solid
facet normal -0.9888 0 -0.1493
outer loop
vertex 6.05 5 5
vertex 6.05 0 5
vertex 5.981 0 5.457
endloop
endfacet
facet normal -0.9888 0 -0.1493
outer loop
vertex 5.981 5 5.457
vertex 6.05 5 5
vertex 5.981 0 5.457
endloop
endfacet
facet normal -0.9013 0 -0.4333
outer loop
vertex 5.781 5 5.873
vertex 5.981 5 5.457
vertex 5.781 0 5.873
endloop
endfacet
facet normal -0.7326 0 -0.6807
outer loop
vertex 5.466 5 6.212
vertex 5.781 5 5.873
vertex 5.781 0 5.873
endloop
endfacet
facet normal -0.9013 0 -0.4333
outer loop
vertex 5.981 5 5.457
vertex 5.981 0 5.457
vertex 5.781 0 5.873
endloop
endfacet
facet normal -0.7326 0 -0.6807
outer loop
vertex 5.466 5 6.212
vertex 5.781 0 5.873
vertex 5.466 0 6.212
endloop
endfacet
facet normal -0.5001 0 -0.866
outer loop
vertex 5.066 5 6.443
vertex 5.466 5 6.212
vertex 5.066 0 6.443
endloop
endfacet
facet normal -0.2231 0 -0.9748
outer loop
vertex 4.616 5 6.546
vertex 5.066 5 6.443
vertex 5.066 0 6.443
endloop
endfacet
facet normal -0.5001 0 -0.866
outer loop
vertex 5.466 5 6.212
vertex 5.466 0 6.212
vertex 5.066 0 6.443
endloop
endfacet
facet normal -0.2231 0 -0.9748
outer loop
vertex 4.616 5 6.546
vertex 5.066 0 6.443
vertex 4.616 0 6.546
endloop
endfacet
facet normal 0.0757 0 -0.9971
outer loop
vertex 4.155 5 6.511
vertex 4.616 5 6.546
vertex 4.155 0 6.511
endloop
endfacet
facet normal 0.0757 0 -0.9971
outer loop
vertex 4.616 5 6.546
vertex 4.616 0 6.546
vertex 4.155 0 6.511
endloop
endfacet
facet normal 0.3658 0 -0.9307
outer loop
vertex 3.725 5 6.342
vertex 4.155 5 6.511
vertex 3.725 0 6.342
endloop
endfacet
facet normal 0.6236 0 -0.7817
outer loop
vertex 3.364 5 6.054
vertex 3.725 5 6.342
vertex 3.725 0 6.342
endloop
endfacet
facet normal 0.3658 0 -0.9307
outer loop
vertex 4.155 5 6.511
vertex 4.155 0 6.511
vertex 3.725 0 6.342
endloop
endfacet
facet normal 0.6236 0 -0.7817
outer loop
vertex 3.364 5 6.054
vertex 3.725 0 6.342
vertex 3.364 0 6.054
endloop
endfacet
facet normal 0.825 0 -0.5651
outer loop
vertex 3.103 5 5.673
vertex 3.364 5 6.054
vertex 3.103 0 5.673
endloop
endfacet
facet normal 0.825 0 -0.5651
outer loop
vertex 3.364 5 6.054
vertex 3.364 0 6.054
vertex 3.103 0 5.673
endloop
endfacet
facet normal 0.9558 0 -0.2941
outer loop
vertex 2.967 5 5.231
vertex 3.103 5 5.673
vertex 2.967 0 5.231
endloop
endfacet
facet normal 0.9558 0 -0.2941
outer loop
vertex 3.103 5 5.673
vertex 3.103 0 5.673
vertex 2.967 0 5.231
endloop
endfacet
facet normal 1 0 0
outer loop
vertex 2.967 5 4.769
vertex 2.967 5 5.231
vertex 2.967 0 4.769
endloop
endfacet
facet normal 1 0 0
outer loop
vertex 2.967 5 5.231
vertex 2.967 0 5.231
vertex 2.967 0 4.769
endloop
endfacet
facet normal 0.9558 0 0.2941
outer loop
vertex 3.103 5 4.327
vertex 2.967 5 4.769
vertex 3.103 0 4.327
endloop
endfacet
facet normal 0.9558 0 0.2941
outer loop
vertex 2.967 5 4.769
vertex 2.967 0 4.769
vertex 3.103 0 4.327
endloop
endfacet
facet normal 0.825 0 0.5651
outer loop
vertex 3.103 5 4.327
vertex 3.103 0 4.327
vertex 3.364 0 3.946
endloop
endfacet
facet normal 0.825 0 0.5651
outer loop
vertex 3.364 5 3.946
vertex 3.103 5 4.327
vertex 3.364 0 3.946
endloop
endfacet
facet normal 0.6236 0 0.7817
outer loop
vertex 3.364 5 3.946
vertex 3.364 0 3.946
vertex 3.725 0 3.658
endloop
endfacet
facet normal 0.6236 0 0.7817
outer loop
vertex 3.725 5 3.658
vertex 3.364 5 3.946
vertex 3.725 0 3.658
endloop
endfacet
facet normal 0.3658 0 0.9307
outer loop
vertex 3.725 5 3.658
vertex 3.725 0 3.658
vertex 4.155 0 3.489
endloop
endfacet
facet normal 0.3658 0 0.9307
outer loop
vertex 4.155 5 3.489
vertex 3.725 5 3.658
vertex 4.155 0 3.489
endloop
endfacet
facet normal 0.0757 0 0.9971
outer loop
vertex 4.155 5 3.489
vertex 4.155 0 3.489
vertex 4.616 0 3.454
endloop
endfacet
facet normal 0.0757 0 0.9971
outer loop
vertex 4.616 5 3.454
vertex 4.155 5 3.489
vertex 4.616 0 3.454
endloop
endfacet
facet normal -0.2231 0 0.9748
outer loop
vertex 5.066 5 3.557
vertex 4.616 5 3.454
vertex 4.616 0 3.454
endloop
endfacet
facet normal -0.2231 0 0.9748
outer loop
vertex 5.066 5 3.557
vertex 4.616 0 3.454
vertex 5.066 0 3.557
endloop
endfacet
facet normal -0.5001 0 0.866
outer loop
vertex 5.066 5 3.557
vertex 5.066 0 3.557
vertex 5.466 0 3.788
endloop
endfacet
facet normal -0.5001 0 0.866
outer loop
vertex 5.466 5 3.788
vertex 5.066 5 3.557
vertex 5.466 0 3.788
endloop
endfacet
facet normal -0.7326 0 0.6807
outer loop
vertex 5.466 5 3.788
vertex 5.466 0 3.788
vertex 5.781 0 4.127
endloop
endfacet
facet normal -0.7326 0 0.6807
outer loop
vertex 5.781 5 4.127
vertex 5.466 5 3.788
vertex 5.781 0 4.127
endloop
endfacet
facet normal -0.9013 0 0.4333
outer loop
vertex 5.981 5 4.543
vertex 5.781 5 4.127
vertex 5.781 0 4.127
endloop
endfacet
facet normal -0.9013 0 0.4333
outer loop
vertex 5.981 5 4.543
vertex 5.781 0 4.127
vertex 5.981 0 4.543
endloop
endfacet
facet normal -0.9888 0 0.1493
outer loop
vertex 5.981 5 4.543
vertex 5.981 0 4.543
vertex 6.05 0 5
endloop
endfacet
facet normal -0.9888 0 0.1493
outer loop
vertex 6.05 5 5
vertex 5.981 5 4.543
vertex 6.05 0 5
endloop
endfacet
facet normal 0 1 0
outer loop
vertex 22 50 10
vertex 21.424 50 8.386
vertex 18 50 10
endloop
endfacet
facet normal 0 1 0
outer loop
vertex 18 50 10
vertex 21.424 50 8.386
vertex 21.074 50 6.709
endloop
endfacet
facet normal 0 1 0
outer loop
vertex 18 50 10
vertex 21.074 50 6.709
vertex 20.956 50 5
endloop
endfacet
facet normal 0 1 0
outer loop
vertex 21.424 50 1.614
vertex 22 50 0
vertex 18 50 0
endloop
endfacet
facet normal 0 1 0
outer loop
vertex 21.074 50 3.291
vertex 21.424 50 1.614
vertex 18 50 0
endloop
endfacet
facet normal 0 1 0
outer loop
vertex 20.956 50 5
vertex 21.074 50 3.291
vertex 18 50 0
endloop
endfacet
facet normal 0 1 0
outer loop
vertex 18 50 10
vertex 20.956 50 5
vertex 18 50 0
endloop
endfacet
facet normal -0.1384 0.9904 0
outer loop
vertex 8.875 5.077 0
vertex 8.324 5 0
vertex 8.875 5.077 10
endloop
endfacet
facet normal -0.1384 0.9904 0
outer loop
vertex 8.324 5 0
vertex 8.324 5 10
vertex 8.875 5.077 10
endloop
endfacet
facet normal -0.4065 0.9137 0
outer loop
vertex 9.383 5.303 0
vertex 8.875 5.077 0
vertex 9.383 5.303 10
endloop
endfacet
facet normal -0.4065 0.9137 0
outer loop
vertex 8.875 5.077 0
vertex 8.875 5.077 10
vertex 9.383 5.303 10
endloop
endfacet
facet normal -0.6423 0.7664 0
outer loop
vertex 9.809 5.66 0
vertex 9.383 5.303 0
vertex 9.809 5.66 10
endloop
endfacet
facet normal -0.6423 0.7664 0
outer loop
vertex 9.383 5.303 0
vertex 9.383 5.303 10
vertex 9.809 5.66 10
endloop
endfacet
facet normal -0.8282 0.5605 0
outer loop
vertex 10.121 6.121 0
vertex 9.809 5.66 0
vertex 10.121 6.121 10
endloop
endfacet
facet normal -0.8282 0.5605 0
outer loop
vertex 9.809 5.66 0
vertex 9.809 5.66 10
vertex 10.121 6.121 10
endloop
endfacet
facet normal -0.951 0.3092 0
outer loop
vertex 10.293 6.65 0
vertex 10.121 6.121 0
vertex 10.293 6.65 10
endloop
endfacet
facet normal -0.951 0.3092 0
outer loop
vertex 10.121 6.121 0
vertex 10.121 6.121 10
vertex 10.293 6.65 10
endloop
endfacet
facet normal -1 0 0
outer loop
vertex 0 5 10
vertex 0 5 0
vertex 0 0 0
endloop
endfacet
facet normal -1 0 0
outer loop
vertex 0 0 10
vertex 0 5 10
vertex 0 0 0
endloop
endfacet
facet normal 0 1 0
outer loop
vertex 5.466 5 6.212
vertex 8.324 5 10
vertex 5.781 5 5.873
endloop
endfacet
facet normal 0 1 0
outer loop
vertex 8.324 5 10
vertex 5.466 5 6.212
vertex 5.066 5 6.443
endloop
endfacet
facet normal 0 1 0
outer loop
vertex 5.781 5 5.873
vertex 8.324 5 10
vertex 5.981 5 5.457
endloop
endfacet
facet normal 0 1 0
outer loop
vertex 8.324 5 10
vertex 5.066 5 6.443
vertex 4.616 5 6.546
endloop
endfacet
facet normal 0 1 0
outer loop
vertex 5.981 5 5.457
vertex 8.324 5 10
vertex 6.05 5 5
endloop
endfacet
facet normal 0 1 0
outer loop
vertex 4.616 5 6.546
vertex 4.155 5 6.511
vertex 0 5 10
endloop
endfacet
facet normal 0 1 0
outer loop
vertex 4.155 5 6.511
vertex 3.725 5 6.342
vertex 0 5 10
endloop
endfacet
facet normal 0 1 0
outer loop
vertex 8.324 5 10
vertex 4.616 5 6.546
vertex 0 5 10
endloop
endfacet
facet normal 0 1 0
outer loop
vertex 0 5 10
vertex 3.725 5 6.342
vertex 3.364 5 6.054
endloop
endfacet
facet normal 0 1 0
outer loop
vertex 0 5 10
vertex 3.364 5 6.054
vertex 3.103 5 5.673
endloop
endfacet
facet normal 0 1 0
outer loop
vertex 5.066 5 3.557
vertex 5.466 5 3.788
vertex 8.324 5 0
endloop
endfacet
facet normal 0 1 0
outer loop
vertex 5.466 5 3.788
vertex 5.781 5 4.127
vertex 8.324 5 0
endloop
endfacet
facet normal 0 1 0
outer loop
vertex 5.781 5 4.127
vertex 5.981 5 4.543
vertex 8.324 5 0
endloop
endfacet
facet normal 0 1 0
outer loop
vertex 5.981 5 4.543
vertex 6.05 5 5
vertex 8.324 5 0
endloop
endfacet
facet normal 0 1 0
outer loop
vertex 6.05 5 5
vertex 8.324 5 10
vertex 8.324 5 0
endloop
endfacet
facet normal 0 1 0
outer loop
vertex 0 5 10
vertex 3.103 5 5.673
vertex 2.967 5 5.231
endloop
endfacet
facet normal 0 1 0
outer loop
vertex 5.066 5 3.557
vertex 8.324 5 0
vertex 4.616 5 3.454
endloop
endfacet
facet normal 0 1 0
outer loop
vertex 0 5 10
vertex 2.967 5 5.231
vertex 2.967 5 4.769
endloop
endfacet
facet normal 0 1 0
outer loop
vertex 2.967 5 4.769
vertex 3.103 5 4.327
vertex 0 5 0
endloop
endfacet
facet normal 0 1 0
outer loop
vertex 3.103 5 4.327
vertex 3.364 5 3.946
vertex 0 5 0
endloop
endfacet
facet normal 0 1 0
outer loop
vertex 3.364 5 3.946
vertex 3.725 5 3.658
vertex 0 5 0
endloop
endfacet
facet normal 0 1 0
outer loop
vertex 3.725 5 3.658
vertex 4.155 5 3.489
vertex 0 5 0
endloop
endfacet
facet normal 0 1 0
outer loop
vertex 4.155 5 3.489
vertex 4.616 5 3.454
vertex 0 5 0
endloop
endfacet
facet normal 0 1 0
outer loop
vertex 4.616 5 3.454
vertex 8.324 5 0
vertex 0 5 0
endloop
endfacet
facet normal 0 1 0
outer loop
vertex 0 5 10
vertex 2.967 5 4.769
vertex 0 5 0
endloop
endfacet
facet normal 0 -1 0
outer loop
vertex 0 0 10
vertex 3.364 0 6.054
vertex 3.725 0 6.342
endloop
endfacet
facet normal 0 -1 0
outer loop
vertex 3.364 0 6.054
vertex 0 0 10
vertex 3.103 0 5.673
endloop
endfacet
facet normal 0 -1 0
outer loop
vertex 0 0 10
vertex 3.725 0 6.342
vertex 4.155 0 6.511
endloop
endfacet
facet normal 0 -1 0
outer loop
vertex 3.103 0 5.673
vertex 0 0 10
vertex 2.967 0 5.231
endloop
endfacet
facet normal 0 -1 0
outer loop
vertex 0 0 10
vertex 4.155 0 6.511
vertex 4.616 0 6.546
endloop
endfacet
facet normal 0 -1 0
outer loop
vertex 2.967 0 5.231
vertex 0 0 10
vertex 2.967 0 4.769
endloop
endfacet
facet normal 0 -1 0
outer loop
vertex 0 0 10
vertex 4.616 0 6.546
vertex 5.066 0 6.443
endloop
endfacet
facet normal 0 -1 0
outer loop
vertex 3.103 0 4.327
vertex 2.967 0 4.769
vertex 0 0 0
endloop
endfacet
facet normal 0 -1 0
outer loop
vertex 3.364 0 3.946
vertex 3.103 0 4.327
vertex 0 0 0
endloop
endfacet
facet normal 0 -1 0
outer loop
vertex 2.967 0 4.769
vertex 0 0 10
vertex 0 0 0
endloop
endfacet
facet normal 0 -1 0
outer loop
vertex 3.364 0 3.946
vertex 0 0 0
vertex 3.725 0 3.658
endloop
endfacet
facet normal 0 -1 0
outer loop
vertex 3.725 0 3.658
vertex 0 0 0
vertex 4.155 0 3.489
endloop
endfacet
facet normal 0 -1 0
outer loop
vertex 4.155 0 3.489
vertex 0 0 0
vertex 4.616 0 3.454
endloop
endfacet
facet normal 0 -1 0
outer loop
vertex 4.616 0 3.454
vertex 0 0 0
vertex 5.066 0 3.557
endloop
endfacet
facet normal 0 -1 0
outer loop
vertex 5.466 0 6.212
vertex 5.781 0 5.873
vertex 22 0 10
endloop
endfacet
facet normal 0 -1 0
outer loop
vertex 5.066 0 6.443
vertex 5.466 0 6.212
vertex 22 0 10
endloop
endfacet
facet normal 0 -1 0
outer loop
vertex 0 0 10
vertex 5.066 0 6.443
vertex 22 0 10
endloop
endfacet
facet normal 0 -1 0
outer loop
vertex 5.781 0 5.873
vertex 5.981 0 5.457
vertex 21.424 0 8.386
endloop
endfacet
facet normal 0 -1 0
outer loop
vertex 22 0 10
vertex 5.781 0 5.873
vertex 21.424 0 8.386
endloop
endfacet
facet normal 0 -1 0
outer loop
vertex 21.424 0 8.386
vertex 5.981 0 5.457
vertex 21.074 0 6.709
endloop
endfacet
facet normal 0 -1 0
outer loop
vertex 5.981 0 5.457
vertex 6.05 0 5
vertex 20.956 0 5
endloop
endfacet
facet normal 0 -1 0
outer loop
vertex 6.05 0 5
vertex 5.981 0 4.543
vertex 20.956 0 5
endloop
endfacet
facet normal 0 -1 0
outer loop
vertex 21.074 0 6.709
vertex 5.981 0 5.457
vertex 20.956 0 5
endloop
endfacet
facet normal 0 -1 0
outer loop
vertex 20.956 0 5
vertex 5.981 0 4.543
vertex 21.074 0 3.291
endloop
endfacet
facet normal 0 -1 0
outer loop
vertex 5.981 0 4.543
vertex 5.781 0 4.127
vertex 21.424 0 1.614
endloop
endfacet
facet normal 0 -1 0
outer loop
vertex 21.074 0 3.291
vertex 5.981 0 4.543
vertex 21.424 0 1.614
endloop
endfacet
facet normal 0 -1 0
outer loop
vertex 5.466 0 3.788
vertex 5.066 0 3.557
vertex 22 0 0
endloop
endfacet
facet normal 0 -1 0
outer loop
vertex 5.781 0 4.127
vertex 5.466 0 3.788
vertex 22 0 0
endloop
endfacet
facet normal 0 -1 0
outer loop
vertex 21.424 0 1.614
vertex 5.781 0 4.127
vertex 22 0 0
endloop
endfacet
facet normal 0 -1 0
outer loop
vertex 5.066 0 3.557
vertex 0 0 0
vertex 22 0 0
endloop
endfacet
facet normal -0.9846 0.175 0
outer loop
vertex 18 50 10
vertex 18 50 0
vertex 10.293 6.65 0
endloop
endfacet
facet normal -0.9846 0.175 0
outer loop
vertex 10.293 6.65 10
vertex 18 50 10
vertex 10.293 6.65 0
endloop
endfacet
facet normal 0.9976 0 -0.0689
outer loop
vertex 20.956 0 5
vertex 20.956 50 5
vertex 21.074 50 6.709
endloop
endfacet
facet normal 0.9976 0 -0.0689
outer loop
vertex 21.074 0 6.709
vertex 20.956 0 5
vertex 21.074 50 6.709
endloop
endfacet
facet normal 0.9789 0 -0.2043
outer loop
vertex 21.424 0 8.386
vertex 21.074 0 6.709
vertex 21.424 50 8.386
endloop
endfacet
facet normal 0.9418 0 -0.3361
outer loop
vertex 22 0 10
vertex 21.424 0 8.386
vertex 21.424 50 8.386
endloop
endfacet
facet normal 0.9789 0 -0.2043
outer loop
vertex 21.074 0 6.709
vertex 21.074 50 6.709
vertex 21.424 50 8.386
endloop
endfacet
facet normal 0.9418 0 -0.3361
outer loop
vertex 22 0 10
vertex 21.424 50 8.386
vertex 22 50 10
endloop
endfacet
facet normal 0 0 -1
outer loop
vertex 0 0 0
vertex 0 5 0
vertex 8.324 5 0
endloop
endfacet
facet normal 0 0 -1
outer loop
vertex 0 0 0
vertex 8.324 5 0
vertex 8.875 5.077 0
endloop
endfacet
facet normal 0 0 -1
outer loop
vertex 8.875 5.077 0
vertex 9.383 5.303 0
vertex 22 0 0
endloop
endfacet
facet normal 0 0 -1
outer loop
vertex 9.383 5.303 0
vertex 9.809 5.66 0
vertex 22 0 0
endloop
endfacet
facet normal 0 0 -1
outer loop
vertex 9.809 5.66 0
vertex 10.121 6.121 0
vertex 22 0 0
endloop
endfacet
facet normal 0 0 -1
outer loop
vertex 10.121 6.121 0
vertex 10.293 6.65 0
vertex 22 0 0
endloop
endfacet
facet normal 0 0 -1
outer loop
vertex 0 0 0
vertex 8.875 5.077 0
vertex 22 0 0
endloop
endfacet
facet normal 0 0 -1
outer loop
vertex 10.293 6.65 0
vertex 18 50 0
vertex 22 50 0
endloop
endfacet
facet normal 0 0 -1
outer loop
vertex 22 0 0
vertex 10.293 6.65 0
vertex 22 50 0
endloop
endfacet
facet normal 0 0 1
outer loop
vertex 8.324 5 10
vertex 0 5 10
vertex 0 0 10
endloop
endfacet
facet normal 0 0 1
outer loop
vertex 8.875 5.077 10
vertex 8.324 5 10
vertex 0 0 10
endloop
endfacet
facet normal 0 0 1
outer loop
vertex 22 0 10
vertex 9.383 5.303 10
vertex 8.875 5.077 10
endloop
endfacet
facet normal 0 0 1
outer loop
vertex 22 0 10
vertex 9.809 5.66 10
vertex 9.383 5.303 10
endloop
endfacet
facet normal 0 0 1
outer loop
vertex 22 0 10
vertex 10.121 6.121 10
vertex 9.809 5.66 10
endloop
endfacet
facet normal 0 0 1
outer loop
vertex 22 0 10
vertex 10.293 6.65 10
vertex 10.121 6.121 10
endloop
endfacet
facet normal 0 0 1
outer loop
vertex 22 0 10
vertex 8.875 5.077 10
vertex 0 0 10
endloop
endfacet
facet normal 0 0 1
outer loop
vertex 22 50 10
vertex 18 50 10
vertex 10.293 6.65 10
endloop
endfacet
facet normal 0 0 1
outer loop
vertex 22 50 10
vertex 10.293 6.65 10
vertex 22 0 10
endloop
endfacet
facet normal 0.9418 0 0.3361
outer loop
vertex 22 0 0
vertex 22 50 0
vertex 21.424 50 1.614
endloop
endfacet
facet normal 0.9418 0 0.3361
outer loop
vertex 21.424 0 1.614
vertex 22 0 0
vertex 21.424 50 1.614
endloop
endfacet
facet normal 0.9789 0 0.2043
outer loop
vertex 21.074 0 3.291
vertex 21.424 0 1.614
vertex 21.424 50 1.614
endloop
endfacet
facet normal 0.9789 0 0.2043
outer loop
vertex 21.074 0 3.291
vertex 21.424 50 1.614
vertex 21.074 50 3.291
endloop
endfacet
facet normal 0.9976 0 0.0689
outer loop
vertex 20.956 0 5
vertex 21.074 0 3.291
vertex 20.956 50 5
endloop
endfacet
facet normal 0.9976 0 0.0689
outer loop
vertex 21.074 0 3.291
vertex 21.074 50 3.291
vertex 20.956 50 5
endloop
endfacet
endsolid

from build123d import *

# Parameters (mm, degrees)
F1_DEPTH = 10
F3_DEPTH = 50.001
F5_D     = 3.1
F6_R     = 2


with BuildPart() as f1:
    # F0 (on Top) → F1 (new body)
    with BuildSketch(Plane.XY):
        Polygon((0, 5), (0, 0), (22, 0), (22, 50), (18, 50), (10, 5), align=None)
    extrude(amount=F1_DEPTH)

    # F2 (on face) → F3 (cut, through all)
    with BuildSketch(Plane(origin=(0, 50, 0), x_dir=(-1, 0, 0), z_dir=(0, 1, 0))):
        with BuildLine():
            Line((-22, 0), (-22, 10))
            ThreePointArc((-22, 10), (-45.956439, 5), (-22, 0))
        make_face()
        with BuildLine():
            ThreePointArc((-22, 0), (-21.22011, 2.446129), (-20.956439, 5))
            ThreePointArc((-20.956439, 5), (-21.22011, 7.553871), (-22, 10))
            Line((-22, 10), (-22, 0))
        make_face()
    extrude(amount=-F3_DEPTH, mode=Mode.SUBTRACT)

    # F5 (through all)
    with Locations(Plane(origin=(0, 5, 0), x_dir=(-1, 0, 0), z_dir=(0, 1, 0))):
        with Locations((-4.5, 5)):
            Hole(F5_D / 2)

    # F6
    f6_edges = [f1.edges().sort_by_distance(p)[0] for p in [
        (10, 5, 5),
    ]]
    fillet(f6_edges, radius=F6_R)


solid = f1.part
